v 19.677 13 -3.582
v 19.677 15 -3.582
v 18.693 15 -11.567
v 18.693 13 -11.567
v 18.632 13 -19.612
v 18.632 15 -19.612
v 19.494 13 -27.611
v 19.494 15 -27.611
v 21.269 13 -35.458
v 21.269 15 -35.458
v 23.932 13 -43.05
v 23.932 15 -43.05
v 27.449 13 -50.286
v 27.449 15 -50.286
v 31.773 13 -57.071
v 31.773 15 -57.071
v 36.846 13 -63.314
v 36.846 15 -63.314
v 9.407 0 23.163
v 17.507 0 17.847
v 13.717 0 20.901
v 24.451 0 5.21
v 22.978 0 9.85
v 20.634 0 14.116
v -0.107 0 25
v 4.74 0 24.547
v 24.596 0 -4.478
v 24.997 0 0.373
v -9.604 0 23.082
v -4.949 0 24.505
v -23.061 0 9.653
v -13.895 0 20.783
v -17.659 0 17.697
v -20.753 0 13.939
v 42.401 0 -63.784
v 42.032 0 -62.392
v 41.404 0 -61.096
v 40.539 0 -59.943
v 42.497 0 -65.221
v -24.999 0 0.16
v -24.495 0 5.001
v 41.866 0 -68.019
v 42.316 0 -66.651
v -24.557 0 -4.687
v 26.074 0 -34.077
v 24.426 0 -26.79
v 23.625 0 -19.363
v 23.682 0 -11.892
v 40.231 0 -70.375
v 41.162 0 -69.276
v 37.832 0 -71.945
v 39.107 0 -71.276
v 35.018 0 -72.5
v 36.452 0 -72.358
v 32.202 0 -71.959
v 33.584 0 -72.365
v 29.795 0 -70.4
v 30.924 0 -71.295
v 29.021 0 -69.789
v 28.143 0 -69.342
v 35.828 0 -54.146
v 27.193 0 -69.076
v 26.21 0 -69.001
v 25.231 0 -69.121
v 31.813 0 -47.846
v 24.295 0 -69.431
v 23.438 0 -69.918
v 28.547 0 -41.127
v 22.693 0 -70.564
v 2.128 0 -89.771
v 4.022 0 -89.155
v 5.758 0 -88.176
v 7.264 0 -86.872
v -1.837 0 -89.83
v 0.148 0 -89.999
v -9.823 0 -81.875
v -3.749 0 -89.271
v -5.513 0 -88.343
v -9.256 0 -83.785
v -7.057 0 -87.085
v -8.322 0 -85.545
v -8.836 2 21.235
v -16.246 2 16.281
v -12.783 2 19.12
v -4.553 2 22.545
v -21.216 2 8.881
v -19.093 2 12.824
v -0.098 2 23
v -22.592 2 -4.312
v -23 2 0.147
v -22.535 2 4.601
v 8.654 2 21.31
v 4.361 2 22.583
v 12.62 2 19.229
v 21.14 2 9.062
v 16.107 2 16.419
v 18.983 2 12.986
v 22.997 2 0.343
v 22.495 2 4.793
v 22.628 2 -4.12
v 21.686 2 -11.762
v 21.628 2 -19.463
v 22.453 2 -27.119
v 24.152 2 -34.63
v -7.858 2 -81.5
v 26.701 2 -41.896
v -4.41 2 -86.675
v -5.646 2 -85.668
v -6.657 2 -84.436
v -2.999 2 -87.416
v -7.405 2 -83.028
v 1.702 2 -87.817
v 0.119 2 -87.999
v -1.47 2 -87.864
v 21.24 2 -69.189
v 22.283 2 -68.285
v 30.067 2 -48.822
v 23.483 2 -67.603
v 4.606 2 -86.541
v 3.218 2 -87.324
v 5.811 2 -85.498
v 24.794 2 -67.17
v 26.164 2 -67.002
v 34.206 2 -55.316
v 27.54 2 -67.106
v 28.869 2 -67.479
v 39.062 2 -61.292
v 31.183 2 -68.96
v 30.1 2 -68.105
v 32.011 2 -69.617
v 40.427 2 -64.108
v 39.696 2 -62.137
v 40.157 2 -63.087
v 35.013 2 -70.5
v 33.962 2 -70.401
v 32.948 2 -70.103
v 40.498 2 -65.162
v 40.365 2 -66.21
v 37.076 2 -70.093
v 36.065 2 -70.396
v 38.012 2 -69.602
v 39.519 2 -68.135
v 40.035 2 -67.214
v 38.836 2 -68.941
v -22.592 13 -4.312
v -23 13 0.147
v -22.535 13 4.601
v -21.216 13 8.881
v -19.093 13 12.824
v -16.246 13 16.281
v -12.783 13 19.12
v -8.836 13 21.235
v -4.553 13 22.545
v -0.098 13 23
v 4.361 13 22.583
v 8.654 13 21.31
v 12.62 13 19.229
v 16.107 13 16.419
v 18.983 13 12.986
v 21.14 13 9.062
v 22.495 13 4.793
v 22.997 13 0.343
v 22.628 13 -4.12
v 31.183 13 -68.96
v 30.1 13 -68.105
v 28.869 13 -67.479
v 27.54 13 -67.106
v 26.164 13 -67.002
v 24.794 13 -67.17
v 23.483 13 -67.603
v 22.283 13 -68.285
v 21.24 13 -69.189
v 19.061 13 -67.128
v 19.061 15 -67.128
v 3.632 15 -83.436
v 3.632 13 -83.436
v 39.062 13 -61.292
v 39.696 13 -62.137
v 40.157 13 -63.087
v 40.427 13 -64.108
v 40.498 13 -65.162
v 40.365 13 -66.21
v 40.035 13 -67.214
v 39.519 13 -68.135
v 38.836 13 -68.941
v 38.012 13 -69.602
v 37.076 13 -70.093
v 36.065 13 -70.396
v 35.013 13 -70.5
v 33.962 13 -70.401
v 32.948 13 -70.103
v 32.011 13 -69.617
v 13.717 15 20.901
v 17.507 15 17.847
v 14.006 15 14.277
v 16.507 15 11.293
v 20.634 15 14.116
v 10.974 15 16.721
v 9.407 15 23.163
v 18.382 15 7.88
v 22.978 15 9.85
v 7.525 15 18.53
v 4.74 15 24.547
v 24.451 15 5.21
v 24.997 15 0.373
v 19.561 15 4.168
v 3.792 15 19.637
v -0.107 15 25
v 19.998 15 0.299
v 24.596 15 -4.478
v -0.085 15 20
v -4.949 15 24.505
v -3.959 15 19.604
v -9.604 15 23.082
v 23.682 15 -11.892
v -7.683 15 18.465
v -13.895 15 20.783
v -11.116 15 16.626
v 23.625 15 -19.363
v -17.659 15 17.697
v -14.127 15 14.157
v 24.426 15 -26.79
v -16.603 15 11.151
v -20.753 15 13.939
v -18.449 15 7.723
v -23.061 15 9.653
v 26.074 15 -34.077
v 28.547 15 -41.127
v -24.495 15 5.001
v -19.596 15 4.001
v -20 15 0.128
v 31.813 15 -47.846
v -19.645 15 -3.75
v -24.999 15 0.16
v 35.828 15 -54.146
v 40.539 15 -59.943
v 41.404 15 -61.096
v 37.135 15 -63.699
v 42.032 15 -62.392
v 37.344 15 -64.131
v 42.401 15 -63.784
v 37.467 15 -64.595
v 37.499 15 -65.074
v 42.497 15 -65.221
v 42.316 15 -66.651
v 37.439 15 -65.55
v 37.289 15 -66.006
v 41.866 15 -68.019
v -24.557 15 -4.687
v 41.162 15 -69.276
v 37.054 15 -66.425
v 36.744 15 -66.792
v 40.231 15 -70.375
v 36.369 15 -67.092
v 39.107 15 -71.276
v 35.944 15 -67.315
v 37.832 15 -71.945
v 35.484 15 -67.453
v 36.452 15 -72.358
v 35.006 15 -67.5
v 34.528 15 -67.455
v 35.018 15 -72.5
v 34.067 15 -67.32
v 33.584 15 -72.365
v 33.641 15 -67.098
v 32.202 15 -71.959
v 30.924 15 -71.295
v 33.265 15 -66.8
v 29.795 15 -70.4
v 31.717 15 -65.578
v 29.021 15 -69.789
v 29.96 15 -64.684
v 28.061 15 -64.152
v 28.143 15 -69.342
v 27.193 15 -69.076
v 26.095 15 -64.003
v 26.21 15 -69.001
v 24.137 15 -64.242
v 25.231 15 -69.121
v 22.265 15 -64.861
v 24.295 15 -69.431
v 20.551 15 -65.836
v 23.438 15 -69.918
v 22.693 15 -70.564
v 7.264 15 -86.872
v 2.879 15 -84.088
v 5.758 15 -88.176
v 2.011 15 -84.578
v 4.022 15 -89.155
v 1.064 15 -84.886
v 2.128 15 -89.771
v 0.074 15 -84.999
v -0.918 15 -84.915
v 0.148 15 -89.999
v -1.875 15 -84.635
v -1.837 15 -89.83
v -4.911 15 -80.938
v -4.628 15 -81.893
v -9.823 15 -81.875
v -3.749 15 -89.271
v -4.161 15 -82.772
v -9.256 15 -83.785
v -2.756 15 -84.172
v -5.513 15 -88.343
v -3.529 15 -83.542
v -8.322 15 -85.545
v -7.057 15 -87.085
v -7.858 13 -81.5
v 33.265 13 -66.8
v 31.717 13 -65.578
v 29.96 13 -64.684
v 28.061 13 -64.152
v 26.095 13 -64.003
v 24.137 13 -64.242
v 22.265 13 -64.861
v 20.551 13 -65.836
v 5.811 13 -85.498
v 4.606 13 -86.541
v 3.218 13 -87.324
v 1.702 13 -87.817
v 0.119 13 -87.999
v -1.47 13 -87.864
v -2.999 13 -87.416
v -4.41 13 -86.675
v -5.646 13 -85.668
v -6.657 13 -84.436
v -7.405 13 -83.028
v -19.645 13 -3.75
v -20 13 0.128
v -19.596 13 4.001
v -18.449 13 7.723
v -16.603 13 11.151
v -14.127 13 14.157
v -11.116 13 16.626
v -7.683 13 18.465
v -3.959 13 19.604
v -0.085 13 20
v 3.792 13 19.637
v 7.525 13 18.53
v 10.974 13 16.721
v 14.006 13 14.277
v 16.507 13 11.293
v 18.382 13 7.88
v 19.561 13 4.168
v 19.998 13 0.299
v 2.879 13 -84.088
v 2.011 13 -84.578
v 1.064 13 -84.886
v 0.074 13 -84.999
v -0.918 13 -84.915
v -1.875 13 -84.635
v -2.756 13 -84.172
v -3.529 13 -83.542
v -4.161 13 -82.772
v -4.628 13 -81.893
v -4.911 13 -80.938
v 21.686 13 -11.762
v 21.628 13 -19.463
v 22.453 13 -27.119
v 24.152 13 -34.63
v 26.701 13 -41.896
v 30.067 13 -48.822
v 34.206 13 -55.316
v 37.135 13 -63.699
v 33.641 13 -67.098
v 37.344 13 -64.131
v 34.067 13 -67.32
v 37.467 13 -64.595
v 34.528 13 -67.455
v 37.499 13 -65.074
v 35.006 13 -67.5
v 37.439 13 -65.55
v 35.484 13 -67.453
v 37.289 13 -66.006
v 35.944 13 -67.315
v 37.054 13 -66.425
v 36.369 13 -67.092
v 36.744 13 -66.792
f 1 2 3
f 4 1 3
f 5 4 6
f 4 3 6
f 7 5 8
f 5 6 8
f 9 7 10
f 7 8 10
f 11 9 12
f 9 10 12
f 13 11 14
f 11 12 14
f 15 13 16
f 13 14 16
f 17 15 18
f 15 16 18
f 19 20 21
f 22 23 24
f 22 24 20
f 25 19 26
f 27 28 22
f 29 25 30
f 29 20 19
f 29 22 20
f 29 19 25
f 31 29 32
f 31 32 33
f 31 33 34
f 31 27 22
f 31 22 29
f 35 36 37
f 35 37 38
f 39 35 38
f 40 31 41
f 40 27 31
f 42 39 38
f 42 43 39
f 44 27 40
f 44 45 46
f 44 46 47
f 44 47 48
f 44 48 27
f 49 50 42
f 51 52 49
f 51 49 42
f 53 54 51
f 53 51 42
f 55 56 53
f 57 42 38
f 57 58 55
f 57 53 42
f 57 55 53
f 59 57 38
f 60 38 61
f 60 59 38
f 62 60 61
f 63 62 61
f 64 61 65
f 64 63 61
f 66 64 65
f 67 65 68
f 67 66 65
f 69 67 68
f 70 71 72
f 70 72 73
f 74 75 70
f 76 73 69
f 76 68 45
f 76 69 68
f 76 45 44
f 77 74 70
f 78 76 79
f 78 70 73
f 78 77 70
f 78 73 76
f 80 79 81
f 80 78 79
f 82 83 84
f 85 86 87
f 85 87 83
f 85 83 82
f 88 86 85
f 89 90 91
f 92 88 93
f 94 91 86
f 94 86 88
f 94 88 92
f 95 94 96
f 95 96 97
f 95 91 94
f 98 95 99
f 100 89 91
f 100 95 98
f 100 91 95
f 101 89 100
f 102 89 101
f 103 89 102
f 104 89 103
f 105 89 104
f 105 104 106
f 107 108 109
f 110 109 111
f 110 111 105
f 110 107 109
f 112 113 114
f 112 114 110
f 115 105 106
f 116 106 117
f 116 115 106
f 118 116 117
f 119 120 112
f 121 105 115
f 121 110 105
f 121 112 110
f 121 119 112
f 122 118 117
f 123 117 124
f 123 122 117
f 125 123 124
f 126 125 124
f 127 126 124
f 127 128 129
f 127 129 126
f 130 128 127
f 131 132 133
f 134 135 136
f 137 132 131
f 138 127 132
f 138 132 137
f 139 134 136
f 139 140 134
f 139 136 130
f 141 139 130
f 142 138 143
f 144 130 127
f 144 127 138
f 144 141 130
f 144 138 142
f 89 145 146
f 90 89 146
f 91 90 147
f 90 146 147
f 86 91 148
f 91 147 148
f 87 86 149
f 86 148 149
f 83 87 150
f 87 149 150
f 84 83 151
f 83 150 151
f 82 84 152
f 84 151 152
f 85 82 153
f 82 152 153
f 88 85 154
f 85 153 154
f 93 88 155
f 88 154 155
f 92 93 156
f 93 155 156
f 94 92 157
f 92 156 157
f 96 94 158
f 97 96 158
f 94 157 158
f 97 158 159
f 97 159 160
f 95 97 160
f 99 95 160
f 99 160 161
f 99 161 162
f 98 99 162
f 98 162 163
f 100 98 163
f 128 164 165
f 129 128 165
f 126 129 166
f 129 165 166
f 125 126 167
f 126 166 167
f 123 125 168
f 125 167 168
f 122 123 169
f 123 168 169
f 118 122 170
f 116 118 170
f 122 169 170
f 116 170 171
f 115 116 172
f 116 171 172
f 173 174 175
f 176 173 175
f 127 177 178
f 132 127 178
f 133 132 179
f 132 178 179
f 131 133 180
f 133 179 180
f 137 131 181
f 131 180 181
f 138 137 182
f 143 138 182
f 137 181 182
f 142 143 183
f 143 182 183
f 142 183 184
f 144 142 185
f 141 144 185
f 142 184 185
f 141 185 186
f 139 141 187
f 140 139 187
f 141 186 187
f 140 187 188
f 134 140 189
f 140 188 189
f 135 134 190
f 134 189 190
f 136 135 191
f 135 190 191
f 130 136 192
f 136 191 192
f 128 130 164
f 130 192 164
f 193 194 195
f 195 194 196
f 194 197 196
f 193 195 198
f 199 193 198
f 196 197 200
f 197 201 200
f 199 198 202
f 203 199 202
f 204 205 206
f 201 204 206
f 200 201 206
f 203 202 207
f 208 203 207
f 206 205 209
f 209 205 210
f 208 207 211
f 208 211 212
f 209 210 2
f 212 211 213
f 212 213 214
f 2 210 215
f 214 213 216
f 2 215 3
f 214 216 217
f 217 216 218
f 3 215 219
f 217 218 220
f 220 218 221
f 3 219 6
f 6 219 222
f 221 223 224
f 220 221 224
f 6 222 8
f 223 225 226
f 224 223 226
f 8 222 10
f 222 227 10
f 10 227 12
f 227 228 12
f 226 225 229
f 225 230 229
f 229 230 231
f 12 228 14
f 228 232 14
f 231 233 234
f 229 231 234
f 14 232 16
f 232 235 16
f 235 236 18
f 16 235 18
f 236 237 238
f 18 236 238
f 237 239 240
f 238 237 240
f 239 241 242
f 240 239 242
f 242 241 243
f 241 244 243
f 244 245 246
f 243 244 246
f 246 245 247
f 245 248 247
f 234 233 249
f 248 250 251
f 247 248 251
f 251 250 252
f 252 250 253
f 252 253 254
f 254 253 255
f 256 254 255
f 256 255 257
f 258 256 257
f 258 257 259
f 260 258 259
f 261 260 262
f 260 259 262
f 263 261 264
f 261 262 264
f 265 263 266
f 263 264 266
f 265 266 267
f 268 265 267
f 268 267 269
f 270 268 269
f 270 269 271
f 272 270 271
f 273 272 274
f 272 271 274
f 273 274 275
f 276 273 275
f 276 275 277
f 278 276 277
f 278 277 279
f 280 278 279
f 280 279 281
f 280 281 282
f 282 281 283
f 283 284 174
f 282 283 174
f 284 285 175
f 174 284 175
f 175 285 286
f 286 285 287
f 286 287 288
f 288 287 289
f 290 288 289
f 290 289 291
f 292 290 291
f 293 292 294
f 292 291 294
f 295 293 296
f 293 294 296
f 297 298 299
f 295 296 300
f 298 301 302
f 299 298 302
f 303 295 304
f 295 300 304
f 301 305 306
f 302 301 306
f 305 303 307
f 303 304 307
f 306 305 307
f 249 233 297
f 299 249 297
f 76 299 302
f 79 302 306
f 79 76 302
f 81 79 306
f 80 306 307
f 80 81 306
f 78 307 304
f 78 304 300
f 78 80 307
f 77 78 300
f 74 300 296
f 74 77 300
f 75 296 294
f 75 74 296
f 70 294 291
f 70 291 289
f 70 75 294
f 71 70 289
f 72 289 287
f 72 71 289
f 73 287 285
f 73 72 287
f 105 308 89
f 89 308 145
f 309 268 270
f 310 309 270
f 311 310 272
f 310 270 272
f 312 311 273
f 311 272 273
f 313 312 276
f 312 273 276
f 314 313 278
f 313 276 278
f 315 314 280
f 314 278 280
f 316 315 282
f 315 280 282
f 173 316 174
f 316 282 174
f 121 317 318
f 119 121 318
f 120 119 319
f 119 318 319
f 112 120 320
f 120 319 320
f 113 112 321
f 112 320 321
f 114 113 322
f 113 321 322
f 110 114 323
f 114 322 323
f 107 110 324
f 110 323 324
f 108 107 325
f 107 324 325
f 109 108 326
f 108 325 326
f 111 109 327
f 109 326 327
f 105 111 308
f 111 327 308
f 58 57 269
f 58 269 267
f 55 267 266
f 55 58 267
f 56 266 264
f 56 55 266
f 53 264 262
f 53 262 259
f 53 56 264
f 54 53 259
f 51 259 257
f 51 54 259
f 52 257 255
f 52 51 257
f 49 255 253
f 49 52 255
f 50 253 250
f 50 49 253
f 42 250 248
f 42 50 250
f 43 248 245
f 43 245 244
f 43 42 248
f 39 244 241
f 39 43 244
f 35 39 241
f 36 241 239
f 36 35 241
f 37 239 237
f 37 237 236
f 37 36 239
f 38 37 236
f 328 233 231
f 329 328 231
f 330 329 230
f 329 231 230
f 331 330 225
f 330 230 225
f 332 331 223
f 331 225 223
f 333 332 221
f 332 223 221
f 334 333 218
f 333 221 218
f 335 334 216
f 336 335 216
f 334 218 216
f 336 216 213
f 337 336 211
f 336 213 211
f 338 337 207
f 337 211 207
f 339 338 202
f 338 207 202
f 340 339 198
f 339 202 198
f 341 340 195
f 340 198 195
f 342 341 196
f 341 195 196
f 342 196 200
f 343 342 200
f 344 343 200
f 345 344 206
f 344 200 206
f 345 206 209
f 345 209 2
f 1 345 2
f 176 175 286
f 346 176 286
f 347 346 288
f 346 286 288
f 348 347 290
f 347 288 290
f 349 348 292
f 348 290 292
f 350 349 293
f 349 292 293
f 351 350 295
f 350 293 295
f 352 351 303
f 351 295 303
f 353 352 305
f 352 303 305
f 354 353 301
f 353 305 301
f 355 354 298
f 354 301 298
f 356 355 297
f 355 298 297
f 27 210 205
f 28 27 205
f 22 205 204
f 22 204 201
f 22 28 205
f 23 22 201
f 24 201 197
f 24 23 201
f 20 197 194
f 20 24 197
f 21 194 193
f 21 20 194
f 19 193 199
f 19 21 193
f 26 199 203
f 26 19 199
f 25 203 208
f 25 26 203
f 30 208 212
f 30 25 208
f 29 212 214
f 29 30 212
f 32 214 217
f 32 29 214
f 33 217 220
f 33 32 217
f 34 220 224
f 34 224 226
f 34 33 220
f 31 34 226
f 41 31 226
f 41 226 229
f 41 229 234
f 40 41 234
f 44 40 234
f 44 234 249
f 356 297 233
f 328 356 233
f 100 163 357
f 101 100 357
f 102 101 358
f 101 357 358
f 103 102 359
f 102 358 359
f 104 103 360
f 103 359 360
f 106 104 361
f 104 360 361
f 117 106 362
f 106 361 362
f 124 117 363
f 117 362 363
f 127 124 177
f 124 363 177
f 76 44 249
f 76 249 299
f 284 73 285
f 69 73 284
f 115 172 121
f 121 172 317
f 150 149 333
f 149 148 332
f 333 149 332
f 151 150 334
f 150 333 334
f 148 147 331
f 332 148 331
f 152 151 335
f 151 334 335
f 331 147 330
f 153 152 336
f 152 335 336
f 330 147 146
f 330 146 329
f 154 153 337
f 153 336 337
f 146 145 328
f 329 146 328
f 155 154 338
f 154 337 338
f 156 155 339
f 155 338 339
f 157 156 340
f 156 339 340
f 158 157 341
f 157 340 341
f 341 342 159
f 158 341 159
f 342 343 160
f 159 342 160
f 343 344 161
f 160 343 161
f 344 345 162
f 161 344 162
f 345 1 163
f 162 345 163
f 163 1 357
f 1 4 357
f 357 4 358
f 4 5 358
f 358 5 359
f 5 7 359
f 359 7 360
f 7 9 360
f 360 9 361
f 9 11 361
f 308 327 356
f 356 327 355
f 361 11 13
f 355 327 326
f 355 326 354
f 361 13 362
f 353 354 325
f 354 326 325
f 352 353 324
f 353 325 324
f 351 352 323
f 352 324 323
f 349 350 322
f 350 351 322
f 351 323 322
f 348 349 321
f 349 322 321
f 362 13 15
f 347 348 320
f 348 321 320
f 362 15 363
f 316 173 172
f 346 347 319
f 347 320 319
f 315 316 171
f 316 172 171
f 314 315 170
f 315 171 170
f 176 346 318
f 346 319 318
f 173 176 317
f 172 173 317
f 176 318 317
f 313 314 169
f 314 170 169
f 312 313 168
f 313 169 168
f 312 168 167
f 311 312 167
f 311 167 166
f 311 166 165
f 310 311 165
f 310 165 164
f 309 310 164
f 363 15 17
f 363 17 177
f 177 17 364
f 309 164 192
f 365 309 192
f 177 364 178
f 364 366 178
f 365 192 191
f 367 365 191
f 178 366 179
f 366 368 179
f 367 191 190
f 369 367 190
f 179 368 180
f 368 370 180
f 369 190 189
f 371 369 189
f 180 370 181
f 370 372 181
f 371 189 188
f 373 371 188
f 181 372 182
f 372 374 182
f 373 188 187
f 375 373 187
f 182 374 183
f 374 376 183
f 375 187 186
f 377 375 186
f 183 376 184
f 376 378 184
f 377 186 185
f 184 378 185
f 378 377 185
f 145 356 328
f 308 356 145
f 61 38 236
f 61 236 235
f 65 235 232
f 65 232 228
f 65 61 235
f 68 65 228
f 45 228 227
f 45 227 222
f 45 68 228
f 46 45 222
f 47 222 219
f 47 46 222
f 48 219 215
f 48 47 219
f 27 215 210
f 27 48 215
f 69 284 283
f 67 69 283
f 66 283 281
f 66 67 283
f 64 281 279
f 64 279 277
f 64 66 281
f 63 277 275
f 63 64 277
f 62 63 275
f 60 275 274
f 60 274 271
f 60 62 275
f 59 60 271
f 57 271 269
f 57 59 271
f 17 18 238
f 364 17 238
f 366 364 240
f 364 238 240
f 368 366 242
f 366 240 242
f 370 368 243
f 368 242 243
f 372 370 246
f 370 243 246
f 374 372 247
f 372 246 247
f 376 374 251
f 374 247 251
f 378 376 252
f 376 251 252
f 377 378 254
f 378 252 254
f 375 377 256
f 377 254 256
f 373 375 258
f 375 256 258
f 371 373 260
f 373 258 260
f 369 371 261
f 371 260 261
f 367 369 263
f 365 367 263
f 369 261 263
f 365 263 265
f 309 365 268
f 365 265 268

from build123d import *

# Parameters (mm, degrees)
BOSS_EXTRUDE2_DEPTH = 15
CUT_EXTRUDE1_DEPTH  = 13
BOSS_EXTRUDE3_DEPTH = 2


with BuildPart() as part:
    # Sketch1 → Boss-Extrude2 (new body)
    with BuildSketch(Plane(origin=(0, 0, 0), x_dir=(1, 0, 0), z_dir=(0, 1, 0))):
        with BuildLine():
            Line((-24.556615071, 4.6875), (-9.822646028, 81.875))
            ThreePointArc((-9.822646028, 81.875), (-2.807110947, 89.597923116), (7.264280872, 86.872424857))
            Line((7.264280872, 86.872424857), (22.693183777, 70.563787572))
            ThreePointArc((22.693183777, 70.563787572), (26.210044162, 69.001329126), (29.795194528, 70.4))
            ThreePointArc((29.795194528, 70.4), (40.230934436, 70.374693007), (40.539091673, 59.943473184))
            ThreePointArc((40.539091673, 59.943473184), (26.07415519, 34.077117396), (24.595709122, 4.477844661))
            ThreePointArc((24.595709122, 4.477844661), (-0.106634546, -24.99977258), (-24.556615071, 4.6875))
        make_face()
    extrude(amount=BOSS_EXTRUDE2_DEPTH)

    # Sketch2 → Cut-Extrude1 (cut)
    with BuildSketch(Plane(origin=(0, 15, 0), x_dir=(1, 0, 0), z_dir=(0, 1, 0))):
        with BuildLine():
            Line((21.240327603, 69.1893026), (5.811424698, 85.497939885))
            ThreePointArc((5.811424698, 85.497939885), (-2.245688757, 87.678338492), (-7.858116823, 81.5))
            Line((-7.858116823, 81.5), (-22.592085865, 4.3125))
            ThreePointArc((-22.592085865, 4.3125), (-0.098103783, -22.999790774), (22.628052392, 4.119617088))
            ThreePointArc((22.628052392, 4.119617088), (24.151989109, 34.629636676), (39.06200056, 61.291880335))
            ThreePointArc((39.06200056, 61.291880335), (38.836018587, 68.941441539), (31.183142654, 68.96))
            ThreePointArc((31.183142654, 68.96), (26.163932142, 67.001860776), (21.240327603, 69.1893026))
        make_face()
    extrude(amount=-CUT_EXTRUDE1_DEPTH, mode=Mode.SUBTRACT)

    # Sketch3 → Boss-Extrude3 (add)
    with BuildSketch(Plane(origin=(0, 15, 0), x_dir=(1, 0, 0), z_dir=(0, 1, 0))):
        with BuildLine():
            Line((22.693183777, 70.563787572), (7.264280872, 86.872424857))
            ThreePointArc((7.264280872, 86.872424857), (-2.807110947, 89.597923116), (-9.822646028, 81.875))
            Line((-9.822646028, 81.875), (-24.556615071, 4.6875))
            ThreePointArc((-24.556615071, 4.6875), (-0.106634546, -24.99977258), (24.595709122, 4.477844661))
            ThreePointArc((24.595709122, 4.477844661), (26.07415519, 34.077117396), (40.539091673, 59.943473184))
            ThreePointArc((40.539091673, 59.943473184), (40.230934436, 70.374693007), (29.795194528, 70.4))
            ThreePointArc((29.795194528, 70.4), (26.210044162, 69.001329126), (22.693183777, 70.563787572))
        make_face()
        with BuildLine():
            Line((19.061043341, 67.127575143), (3.632140436, 83.436212428))
            ThreePointArc((3.632140436, 83.436212428), (-1.403555473, 84.798961558), (-4.911323014, 80.9375))
            Line((-4.911323014, 80.9375), (-19.645292057, 3.75))
            ThreePointArc((-19.645292057, 3.75), (-0.085307637, -19.999818064), (19.676567297, 3.582275729))
            ThreePointArc((19.676567297, 3.582275729), (21.268739987, 35.458415597), (36.846363891, 63.314491061))
            ThreePointArc((36.846363891, 63.314491061), (36.743644812, 66.791564336), (33.265064843, 66.8))
            ThreePointArc((33.265064843, 66.8), (26.094764111, 64.002658251), (19.061043341, 67.127575143))
        make_face(mode=Mode.SUBTRACT)
    extrude(amount=-BOSS_EXTRUDE3_DEPTH)


solid = part.part
